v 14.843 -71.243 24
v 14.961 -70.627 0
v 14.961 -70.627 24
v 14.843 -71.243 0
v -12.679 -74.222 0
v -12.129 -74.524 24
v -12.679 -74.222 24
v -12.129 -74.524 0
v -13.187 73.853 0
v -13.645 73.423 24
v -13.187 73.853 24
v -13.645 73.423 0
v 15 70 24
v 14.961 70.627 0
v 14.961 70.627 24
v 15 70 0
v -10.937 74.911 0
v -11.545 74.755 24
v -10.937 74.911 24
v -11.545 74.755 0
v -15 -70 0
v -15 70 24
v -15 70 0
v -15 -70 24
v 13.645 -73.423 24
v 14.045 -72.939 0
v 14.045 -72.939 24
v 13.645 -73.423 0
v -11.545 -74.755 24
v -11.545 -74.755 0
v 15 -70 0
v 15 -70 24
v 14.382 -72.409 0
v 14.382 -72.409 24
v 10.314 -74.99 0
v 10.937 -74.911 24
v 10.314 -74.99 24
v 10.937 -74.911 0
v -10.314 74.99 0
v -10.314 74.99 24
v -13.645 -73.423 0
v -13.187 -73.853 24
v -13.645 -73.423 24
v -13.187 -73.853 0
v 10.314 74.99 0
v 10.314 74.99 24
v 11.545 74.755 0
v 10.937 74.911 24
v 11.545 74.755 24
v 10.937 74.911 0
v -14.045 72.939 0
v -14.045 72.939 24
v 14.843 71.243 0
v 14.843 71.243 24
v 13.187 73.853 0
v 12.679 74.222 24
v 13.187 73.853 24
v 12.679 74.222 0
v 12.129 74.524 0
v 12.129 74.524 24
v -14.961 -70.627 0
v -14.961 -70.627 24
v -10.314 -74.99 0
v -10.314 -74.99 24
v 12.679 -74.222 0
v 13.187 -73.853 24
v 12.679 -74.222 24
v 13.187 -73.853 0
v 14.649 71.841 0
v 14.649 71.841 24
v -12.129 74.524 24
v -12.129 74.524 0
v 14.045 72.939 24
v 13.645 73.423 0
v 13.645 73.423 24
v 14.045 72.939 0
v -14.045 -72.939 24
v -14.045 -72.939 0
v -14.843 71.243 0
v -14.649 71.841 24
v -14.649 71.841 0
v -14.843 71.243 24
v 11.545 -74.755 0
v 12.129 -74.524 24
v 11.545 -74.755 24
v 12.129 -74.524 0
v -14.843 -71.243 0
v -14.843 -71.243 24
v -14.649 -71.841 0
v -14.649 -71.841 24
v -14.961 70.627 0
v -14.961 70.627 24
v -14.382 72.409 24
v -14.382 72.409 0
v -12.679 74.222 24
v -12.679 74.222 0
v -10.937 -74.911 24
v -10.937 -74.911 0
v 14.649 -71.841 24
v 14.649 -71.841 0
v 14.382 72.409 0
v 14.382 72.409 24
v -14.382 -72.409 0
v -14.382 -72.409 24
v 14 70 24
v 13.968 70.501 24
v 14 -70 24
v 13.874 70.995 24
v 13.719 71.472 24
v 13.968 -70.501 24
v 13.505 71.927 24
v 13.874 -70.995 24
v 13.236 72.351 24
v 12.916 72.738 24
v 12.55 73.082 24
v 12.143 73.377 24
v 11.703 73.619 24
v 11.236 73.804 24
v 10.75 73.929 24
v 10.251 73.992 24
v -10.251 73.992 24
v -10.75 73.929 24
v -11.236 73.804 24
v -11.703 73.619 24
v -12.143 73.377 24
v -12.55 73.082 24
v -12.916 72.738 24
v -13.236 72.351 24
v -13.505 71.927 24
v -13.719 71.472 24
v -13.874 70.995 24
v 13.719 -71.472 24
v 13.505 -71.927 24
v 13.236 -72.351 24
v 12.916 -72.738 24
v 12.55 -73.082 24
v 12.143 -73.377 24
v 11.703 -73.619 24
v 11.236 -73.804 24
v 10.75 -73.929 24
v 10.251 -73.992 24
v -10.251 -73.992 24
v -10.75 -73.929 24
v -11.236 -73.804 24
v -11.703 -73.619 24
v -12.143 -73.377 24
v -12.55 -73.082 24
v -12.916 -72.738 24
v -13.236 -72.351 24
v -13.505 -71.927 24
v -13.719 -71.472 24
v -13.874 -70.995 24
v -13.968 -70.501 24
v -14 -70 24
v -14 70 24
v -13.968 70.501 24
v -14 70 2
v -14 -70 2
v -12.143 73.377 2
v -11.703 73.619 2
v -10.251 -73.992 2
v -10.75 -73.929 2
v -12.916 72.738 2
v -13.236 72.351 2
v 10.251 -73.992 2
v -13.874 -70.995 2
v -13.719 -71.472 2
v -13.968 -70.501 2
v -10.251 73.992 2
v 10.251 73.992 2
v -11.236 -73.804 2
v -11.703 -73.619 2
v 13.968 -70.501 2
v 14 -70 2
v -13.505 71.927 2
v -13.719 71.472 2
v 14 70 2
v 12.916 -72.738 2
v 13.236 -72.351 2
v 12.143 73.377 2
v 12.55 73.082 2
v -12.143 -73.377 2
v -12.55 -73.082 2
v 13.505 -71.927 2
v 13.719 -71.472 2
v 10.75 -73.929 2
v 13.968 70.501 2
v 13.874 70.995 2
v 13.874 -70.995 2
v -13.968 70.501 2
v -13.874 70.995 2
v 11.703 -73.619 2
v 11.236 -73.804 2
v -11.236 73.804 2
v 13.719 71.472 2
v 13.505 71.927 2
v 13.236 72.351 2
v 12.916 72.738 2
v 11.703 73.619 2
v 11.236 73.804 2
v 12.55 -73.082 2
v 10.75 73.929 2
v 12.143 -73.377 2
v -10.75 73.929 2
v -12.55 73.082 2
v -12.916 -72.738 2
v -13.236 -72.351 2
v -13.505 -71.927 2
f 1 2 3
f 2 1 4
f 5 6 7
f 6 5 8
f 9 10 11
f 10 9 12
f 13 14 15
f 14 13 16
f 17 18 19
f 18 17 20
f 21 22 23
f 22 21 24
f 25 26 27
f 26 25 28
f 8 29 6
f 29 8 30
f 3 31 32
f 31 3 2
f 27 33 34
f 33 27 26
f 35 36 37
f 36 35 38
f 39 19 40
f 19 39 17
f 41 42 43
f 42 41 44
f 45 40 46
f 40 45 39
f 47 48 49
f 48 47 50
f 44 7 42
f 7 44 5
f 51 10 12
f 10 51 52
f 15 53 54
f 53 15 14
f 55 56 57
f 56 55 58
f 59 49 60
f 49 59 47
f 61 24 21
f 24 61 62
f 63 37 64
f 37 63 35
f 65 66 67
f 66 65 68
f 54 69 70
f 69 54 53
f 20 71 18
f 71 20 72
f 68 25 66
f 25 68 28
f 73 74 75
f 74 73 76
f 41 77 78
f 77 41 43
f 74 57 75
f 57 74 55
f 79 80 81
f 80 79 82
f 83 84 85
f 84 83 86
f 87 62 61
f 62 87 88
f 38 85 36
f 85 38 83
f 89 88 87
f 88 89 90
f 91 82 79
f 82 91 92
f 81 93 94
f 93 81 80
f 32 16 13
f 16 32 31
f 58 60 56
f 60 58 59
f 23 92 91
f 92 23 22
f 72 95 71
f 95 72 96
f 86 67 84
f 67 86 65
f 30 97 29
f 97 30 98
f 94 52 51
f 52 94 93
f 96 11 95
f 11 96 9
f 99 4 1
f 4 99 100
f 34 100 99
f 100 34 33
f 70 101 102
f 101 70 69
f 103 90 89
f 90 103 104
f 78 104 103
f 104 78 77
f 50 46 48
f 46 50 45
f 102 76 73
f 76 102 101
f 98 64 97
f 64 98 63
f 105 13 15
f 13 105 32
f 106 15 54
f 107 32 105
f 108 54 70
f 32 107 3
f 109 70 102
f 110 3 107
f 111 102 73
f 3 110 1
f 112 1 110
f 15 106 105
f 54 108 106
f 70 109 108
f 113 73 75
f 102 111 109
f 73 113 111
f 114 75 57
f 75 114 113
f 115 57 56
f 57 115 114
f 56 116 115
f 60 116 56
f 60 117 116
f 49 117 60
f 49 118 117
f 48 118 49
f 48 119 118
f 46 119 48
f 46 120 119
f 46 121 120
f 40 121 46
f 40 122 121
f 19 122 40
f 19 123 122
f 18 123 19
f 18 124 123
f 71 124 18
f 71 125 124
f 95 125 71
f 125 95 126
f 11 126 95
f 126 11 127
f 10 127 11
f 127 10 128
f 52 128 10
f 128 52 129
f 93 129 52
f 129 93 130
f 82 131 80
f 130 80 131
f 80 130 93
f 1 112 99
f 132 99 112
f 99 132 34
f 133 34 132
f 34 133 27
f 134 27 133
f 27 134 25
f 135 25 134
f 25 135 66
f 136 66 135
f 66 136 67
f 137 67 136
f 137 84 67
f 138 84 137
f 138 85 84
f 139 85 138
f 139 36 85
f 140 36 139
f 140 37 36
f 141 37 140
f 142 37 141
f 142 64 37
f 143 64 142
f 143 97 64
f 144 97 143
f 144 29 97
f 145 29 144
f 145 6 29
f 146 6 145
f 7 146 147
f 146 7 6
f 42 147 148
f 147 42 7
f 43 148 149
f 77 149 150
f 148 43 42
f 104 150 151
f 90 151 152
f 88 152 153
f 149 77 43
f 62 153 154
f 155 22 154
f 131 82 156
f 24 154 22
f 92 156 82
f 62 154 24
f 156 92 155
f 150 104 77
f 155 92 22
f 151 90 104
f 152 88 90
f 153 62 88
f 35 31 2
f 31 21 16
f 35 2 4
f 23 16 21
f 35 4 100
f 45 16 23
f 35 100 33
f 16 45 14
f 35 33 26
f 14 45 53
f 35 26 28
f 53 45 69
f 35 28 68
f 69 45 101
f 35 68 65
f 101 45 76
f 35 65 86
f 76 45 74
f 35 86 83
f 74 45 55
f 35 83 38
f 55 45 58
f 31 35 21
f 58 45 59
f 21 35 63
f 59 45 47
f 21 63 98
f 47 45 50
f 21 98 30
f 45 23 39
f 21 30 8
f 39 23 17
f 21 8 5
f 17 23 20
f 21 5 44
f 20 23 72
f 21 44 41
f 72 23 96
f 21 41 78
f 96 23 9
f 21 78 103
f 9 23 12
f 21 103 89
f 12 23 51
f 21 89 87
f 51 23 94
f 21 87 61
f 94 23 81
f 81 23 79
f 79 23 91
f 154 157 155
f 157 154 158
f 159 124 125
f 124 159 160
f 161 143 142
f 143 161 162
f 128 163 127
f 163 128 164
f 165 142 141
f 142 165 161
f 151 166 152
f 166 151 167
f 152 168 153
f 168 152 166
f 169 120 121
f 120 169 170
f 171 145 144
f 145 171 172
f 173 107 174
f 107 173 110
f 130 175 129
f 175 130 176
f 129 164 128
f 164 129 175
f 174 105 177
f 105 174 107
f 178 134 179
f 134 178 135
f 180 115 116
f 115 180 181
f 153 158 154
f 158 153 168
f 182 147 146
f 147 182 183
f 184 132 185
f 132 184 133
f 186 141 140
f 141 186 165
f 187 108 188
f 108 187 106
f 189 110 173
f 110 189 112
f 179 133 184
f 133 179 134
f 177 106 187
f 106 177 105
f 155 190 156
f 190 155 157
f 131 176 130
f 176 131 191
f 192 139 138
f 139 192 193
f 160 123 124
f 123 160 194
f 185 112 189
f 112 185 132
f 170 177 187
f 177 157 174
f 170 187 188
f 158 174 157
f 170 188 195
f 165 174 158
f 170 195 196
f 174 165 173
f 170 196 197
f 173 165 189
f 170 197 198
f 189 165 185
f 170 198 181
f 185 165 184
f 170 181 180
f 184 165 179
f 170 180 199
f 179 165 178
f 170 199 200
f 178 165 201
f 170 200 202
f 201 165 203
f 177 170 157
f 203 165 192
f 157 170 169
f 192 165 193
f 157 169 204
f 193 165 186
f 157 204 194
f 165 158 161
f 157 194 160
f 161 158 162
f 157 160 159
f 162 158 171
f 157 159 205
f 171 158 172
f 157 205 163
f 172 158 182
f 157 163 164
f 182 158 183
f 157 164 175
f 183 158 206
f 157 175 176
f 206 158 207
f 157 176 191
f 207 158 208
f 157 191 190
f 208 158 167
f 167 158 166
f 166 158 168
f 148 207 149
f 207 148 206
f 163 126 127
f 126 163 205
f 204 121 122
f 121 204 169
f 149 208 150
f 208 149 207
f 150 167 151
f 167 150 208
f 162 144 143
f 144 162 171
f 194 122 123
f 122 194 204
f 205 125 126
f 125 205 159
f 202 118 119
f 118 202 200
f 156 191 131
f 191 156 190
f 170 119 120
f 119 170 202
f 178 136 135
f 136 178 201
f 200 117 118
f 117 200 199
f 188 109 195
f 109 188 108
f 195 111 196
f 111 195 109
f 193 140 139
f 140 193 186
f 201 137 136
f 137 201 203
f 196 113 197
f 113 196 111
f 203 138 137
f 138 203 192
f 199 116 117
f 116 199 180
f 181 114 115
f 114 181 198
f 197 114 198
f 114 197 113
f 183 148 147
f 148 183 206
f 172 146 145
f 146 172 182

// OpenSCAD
$fn = 50;


difference() {
	union() {
		hull() {
			translate(v = [-10.0000000000, 70.0000000000, 0]) {
				cylinder(h = 24, r = 5);
			}
			translate(v = [10.0000000000, 70.0000000000, 0]) {
				cylinder(h = 24, r = 5);
			}
			translate(v = [-10.0000000000, -70.0000000000, 0]) {
				cylinder(h = 24, r = 5);
			}
			translate(v = [10.0000000000, -70.0000000000, 0]) {
				cylinder(h = 24, r = 5);
			}
		}
	}
	union() {
		translate(v = [0, 0, 2]) {
			hull() {
				translate(v = [-10.0000000000, 70.0000000000, 0]) {
					cylinder(h = 22, r = 4);
				}
				translate(v = [10.0000000000, 70.0000000000, 0]) {
					cylinder(h = 22, r = 4);
				}
				translate(v = [-10.0000000000, -70.0000000000, 0]) {
					cylinder(h = 22, r = 4);
				}
				translate(v = [10.0000000000, -70.0000000000, 0]) {
					cylinder(h = 22, r = 4);
				}
			}
		}
	}
}
